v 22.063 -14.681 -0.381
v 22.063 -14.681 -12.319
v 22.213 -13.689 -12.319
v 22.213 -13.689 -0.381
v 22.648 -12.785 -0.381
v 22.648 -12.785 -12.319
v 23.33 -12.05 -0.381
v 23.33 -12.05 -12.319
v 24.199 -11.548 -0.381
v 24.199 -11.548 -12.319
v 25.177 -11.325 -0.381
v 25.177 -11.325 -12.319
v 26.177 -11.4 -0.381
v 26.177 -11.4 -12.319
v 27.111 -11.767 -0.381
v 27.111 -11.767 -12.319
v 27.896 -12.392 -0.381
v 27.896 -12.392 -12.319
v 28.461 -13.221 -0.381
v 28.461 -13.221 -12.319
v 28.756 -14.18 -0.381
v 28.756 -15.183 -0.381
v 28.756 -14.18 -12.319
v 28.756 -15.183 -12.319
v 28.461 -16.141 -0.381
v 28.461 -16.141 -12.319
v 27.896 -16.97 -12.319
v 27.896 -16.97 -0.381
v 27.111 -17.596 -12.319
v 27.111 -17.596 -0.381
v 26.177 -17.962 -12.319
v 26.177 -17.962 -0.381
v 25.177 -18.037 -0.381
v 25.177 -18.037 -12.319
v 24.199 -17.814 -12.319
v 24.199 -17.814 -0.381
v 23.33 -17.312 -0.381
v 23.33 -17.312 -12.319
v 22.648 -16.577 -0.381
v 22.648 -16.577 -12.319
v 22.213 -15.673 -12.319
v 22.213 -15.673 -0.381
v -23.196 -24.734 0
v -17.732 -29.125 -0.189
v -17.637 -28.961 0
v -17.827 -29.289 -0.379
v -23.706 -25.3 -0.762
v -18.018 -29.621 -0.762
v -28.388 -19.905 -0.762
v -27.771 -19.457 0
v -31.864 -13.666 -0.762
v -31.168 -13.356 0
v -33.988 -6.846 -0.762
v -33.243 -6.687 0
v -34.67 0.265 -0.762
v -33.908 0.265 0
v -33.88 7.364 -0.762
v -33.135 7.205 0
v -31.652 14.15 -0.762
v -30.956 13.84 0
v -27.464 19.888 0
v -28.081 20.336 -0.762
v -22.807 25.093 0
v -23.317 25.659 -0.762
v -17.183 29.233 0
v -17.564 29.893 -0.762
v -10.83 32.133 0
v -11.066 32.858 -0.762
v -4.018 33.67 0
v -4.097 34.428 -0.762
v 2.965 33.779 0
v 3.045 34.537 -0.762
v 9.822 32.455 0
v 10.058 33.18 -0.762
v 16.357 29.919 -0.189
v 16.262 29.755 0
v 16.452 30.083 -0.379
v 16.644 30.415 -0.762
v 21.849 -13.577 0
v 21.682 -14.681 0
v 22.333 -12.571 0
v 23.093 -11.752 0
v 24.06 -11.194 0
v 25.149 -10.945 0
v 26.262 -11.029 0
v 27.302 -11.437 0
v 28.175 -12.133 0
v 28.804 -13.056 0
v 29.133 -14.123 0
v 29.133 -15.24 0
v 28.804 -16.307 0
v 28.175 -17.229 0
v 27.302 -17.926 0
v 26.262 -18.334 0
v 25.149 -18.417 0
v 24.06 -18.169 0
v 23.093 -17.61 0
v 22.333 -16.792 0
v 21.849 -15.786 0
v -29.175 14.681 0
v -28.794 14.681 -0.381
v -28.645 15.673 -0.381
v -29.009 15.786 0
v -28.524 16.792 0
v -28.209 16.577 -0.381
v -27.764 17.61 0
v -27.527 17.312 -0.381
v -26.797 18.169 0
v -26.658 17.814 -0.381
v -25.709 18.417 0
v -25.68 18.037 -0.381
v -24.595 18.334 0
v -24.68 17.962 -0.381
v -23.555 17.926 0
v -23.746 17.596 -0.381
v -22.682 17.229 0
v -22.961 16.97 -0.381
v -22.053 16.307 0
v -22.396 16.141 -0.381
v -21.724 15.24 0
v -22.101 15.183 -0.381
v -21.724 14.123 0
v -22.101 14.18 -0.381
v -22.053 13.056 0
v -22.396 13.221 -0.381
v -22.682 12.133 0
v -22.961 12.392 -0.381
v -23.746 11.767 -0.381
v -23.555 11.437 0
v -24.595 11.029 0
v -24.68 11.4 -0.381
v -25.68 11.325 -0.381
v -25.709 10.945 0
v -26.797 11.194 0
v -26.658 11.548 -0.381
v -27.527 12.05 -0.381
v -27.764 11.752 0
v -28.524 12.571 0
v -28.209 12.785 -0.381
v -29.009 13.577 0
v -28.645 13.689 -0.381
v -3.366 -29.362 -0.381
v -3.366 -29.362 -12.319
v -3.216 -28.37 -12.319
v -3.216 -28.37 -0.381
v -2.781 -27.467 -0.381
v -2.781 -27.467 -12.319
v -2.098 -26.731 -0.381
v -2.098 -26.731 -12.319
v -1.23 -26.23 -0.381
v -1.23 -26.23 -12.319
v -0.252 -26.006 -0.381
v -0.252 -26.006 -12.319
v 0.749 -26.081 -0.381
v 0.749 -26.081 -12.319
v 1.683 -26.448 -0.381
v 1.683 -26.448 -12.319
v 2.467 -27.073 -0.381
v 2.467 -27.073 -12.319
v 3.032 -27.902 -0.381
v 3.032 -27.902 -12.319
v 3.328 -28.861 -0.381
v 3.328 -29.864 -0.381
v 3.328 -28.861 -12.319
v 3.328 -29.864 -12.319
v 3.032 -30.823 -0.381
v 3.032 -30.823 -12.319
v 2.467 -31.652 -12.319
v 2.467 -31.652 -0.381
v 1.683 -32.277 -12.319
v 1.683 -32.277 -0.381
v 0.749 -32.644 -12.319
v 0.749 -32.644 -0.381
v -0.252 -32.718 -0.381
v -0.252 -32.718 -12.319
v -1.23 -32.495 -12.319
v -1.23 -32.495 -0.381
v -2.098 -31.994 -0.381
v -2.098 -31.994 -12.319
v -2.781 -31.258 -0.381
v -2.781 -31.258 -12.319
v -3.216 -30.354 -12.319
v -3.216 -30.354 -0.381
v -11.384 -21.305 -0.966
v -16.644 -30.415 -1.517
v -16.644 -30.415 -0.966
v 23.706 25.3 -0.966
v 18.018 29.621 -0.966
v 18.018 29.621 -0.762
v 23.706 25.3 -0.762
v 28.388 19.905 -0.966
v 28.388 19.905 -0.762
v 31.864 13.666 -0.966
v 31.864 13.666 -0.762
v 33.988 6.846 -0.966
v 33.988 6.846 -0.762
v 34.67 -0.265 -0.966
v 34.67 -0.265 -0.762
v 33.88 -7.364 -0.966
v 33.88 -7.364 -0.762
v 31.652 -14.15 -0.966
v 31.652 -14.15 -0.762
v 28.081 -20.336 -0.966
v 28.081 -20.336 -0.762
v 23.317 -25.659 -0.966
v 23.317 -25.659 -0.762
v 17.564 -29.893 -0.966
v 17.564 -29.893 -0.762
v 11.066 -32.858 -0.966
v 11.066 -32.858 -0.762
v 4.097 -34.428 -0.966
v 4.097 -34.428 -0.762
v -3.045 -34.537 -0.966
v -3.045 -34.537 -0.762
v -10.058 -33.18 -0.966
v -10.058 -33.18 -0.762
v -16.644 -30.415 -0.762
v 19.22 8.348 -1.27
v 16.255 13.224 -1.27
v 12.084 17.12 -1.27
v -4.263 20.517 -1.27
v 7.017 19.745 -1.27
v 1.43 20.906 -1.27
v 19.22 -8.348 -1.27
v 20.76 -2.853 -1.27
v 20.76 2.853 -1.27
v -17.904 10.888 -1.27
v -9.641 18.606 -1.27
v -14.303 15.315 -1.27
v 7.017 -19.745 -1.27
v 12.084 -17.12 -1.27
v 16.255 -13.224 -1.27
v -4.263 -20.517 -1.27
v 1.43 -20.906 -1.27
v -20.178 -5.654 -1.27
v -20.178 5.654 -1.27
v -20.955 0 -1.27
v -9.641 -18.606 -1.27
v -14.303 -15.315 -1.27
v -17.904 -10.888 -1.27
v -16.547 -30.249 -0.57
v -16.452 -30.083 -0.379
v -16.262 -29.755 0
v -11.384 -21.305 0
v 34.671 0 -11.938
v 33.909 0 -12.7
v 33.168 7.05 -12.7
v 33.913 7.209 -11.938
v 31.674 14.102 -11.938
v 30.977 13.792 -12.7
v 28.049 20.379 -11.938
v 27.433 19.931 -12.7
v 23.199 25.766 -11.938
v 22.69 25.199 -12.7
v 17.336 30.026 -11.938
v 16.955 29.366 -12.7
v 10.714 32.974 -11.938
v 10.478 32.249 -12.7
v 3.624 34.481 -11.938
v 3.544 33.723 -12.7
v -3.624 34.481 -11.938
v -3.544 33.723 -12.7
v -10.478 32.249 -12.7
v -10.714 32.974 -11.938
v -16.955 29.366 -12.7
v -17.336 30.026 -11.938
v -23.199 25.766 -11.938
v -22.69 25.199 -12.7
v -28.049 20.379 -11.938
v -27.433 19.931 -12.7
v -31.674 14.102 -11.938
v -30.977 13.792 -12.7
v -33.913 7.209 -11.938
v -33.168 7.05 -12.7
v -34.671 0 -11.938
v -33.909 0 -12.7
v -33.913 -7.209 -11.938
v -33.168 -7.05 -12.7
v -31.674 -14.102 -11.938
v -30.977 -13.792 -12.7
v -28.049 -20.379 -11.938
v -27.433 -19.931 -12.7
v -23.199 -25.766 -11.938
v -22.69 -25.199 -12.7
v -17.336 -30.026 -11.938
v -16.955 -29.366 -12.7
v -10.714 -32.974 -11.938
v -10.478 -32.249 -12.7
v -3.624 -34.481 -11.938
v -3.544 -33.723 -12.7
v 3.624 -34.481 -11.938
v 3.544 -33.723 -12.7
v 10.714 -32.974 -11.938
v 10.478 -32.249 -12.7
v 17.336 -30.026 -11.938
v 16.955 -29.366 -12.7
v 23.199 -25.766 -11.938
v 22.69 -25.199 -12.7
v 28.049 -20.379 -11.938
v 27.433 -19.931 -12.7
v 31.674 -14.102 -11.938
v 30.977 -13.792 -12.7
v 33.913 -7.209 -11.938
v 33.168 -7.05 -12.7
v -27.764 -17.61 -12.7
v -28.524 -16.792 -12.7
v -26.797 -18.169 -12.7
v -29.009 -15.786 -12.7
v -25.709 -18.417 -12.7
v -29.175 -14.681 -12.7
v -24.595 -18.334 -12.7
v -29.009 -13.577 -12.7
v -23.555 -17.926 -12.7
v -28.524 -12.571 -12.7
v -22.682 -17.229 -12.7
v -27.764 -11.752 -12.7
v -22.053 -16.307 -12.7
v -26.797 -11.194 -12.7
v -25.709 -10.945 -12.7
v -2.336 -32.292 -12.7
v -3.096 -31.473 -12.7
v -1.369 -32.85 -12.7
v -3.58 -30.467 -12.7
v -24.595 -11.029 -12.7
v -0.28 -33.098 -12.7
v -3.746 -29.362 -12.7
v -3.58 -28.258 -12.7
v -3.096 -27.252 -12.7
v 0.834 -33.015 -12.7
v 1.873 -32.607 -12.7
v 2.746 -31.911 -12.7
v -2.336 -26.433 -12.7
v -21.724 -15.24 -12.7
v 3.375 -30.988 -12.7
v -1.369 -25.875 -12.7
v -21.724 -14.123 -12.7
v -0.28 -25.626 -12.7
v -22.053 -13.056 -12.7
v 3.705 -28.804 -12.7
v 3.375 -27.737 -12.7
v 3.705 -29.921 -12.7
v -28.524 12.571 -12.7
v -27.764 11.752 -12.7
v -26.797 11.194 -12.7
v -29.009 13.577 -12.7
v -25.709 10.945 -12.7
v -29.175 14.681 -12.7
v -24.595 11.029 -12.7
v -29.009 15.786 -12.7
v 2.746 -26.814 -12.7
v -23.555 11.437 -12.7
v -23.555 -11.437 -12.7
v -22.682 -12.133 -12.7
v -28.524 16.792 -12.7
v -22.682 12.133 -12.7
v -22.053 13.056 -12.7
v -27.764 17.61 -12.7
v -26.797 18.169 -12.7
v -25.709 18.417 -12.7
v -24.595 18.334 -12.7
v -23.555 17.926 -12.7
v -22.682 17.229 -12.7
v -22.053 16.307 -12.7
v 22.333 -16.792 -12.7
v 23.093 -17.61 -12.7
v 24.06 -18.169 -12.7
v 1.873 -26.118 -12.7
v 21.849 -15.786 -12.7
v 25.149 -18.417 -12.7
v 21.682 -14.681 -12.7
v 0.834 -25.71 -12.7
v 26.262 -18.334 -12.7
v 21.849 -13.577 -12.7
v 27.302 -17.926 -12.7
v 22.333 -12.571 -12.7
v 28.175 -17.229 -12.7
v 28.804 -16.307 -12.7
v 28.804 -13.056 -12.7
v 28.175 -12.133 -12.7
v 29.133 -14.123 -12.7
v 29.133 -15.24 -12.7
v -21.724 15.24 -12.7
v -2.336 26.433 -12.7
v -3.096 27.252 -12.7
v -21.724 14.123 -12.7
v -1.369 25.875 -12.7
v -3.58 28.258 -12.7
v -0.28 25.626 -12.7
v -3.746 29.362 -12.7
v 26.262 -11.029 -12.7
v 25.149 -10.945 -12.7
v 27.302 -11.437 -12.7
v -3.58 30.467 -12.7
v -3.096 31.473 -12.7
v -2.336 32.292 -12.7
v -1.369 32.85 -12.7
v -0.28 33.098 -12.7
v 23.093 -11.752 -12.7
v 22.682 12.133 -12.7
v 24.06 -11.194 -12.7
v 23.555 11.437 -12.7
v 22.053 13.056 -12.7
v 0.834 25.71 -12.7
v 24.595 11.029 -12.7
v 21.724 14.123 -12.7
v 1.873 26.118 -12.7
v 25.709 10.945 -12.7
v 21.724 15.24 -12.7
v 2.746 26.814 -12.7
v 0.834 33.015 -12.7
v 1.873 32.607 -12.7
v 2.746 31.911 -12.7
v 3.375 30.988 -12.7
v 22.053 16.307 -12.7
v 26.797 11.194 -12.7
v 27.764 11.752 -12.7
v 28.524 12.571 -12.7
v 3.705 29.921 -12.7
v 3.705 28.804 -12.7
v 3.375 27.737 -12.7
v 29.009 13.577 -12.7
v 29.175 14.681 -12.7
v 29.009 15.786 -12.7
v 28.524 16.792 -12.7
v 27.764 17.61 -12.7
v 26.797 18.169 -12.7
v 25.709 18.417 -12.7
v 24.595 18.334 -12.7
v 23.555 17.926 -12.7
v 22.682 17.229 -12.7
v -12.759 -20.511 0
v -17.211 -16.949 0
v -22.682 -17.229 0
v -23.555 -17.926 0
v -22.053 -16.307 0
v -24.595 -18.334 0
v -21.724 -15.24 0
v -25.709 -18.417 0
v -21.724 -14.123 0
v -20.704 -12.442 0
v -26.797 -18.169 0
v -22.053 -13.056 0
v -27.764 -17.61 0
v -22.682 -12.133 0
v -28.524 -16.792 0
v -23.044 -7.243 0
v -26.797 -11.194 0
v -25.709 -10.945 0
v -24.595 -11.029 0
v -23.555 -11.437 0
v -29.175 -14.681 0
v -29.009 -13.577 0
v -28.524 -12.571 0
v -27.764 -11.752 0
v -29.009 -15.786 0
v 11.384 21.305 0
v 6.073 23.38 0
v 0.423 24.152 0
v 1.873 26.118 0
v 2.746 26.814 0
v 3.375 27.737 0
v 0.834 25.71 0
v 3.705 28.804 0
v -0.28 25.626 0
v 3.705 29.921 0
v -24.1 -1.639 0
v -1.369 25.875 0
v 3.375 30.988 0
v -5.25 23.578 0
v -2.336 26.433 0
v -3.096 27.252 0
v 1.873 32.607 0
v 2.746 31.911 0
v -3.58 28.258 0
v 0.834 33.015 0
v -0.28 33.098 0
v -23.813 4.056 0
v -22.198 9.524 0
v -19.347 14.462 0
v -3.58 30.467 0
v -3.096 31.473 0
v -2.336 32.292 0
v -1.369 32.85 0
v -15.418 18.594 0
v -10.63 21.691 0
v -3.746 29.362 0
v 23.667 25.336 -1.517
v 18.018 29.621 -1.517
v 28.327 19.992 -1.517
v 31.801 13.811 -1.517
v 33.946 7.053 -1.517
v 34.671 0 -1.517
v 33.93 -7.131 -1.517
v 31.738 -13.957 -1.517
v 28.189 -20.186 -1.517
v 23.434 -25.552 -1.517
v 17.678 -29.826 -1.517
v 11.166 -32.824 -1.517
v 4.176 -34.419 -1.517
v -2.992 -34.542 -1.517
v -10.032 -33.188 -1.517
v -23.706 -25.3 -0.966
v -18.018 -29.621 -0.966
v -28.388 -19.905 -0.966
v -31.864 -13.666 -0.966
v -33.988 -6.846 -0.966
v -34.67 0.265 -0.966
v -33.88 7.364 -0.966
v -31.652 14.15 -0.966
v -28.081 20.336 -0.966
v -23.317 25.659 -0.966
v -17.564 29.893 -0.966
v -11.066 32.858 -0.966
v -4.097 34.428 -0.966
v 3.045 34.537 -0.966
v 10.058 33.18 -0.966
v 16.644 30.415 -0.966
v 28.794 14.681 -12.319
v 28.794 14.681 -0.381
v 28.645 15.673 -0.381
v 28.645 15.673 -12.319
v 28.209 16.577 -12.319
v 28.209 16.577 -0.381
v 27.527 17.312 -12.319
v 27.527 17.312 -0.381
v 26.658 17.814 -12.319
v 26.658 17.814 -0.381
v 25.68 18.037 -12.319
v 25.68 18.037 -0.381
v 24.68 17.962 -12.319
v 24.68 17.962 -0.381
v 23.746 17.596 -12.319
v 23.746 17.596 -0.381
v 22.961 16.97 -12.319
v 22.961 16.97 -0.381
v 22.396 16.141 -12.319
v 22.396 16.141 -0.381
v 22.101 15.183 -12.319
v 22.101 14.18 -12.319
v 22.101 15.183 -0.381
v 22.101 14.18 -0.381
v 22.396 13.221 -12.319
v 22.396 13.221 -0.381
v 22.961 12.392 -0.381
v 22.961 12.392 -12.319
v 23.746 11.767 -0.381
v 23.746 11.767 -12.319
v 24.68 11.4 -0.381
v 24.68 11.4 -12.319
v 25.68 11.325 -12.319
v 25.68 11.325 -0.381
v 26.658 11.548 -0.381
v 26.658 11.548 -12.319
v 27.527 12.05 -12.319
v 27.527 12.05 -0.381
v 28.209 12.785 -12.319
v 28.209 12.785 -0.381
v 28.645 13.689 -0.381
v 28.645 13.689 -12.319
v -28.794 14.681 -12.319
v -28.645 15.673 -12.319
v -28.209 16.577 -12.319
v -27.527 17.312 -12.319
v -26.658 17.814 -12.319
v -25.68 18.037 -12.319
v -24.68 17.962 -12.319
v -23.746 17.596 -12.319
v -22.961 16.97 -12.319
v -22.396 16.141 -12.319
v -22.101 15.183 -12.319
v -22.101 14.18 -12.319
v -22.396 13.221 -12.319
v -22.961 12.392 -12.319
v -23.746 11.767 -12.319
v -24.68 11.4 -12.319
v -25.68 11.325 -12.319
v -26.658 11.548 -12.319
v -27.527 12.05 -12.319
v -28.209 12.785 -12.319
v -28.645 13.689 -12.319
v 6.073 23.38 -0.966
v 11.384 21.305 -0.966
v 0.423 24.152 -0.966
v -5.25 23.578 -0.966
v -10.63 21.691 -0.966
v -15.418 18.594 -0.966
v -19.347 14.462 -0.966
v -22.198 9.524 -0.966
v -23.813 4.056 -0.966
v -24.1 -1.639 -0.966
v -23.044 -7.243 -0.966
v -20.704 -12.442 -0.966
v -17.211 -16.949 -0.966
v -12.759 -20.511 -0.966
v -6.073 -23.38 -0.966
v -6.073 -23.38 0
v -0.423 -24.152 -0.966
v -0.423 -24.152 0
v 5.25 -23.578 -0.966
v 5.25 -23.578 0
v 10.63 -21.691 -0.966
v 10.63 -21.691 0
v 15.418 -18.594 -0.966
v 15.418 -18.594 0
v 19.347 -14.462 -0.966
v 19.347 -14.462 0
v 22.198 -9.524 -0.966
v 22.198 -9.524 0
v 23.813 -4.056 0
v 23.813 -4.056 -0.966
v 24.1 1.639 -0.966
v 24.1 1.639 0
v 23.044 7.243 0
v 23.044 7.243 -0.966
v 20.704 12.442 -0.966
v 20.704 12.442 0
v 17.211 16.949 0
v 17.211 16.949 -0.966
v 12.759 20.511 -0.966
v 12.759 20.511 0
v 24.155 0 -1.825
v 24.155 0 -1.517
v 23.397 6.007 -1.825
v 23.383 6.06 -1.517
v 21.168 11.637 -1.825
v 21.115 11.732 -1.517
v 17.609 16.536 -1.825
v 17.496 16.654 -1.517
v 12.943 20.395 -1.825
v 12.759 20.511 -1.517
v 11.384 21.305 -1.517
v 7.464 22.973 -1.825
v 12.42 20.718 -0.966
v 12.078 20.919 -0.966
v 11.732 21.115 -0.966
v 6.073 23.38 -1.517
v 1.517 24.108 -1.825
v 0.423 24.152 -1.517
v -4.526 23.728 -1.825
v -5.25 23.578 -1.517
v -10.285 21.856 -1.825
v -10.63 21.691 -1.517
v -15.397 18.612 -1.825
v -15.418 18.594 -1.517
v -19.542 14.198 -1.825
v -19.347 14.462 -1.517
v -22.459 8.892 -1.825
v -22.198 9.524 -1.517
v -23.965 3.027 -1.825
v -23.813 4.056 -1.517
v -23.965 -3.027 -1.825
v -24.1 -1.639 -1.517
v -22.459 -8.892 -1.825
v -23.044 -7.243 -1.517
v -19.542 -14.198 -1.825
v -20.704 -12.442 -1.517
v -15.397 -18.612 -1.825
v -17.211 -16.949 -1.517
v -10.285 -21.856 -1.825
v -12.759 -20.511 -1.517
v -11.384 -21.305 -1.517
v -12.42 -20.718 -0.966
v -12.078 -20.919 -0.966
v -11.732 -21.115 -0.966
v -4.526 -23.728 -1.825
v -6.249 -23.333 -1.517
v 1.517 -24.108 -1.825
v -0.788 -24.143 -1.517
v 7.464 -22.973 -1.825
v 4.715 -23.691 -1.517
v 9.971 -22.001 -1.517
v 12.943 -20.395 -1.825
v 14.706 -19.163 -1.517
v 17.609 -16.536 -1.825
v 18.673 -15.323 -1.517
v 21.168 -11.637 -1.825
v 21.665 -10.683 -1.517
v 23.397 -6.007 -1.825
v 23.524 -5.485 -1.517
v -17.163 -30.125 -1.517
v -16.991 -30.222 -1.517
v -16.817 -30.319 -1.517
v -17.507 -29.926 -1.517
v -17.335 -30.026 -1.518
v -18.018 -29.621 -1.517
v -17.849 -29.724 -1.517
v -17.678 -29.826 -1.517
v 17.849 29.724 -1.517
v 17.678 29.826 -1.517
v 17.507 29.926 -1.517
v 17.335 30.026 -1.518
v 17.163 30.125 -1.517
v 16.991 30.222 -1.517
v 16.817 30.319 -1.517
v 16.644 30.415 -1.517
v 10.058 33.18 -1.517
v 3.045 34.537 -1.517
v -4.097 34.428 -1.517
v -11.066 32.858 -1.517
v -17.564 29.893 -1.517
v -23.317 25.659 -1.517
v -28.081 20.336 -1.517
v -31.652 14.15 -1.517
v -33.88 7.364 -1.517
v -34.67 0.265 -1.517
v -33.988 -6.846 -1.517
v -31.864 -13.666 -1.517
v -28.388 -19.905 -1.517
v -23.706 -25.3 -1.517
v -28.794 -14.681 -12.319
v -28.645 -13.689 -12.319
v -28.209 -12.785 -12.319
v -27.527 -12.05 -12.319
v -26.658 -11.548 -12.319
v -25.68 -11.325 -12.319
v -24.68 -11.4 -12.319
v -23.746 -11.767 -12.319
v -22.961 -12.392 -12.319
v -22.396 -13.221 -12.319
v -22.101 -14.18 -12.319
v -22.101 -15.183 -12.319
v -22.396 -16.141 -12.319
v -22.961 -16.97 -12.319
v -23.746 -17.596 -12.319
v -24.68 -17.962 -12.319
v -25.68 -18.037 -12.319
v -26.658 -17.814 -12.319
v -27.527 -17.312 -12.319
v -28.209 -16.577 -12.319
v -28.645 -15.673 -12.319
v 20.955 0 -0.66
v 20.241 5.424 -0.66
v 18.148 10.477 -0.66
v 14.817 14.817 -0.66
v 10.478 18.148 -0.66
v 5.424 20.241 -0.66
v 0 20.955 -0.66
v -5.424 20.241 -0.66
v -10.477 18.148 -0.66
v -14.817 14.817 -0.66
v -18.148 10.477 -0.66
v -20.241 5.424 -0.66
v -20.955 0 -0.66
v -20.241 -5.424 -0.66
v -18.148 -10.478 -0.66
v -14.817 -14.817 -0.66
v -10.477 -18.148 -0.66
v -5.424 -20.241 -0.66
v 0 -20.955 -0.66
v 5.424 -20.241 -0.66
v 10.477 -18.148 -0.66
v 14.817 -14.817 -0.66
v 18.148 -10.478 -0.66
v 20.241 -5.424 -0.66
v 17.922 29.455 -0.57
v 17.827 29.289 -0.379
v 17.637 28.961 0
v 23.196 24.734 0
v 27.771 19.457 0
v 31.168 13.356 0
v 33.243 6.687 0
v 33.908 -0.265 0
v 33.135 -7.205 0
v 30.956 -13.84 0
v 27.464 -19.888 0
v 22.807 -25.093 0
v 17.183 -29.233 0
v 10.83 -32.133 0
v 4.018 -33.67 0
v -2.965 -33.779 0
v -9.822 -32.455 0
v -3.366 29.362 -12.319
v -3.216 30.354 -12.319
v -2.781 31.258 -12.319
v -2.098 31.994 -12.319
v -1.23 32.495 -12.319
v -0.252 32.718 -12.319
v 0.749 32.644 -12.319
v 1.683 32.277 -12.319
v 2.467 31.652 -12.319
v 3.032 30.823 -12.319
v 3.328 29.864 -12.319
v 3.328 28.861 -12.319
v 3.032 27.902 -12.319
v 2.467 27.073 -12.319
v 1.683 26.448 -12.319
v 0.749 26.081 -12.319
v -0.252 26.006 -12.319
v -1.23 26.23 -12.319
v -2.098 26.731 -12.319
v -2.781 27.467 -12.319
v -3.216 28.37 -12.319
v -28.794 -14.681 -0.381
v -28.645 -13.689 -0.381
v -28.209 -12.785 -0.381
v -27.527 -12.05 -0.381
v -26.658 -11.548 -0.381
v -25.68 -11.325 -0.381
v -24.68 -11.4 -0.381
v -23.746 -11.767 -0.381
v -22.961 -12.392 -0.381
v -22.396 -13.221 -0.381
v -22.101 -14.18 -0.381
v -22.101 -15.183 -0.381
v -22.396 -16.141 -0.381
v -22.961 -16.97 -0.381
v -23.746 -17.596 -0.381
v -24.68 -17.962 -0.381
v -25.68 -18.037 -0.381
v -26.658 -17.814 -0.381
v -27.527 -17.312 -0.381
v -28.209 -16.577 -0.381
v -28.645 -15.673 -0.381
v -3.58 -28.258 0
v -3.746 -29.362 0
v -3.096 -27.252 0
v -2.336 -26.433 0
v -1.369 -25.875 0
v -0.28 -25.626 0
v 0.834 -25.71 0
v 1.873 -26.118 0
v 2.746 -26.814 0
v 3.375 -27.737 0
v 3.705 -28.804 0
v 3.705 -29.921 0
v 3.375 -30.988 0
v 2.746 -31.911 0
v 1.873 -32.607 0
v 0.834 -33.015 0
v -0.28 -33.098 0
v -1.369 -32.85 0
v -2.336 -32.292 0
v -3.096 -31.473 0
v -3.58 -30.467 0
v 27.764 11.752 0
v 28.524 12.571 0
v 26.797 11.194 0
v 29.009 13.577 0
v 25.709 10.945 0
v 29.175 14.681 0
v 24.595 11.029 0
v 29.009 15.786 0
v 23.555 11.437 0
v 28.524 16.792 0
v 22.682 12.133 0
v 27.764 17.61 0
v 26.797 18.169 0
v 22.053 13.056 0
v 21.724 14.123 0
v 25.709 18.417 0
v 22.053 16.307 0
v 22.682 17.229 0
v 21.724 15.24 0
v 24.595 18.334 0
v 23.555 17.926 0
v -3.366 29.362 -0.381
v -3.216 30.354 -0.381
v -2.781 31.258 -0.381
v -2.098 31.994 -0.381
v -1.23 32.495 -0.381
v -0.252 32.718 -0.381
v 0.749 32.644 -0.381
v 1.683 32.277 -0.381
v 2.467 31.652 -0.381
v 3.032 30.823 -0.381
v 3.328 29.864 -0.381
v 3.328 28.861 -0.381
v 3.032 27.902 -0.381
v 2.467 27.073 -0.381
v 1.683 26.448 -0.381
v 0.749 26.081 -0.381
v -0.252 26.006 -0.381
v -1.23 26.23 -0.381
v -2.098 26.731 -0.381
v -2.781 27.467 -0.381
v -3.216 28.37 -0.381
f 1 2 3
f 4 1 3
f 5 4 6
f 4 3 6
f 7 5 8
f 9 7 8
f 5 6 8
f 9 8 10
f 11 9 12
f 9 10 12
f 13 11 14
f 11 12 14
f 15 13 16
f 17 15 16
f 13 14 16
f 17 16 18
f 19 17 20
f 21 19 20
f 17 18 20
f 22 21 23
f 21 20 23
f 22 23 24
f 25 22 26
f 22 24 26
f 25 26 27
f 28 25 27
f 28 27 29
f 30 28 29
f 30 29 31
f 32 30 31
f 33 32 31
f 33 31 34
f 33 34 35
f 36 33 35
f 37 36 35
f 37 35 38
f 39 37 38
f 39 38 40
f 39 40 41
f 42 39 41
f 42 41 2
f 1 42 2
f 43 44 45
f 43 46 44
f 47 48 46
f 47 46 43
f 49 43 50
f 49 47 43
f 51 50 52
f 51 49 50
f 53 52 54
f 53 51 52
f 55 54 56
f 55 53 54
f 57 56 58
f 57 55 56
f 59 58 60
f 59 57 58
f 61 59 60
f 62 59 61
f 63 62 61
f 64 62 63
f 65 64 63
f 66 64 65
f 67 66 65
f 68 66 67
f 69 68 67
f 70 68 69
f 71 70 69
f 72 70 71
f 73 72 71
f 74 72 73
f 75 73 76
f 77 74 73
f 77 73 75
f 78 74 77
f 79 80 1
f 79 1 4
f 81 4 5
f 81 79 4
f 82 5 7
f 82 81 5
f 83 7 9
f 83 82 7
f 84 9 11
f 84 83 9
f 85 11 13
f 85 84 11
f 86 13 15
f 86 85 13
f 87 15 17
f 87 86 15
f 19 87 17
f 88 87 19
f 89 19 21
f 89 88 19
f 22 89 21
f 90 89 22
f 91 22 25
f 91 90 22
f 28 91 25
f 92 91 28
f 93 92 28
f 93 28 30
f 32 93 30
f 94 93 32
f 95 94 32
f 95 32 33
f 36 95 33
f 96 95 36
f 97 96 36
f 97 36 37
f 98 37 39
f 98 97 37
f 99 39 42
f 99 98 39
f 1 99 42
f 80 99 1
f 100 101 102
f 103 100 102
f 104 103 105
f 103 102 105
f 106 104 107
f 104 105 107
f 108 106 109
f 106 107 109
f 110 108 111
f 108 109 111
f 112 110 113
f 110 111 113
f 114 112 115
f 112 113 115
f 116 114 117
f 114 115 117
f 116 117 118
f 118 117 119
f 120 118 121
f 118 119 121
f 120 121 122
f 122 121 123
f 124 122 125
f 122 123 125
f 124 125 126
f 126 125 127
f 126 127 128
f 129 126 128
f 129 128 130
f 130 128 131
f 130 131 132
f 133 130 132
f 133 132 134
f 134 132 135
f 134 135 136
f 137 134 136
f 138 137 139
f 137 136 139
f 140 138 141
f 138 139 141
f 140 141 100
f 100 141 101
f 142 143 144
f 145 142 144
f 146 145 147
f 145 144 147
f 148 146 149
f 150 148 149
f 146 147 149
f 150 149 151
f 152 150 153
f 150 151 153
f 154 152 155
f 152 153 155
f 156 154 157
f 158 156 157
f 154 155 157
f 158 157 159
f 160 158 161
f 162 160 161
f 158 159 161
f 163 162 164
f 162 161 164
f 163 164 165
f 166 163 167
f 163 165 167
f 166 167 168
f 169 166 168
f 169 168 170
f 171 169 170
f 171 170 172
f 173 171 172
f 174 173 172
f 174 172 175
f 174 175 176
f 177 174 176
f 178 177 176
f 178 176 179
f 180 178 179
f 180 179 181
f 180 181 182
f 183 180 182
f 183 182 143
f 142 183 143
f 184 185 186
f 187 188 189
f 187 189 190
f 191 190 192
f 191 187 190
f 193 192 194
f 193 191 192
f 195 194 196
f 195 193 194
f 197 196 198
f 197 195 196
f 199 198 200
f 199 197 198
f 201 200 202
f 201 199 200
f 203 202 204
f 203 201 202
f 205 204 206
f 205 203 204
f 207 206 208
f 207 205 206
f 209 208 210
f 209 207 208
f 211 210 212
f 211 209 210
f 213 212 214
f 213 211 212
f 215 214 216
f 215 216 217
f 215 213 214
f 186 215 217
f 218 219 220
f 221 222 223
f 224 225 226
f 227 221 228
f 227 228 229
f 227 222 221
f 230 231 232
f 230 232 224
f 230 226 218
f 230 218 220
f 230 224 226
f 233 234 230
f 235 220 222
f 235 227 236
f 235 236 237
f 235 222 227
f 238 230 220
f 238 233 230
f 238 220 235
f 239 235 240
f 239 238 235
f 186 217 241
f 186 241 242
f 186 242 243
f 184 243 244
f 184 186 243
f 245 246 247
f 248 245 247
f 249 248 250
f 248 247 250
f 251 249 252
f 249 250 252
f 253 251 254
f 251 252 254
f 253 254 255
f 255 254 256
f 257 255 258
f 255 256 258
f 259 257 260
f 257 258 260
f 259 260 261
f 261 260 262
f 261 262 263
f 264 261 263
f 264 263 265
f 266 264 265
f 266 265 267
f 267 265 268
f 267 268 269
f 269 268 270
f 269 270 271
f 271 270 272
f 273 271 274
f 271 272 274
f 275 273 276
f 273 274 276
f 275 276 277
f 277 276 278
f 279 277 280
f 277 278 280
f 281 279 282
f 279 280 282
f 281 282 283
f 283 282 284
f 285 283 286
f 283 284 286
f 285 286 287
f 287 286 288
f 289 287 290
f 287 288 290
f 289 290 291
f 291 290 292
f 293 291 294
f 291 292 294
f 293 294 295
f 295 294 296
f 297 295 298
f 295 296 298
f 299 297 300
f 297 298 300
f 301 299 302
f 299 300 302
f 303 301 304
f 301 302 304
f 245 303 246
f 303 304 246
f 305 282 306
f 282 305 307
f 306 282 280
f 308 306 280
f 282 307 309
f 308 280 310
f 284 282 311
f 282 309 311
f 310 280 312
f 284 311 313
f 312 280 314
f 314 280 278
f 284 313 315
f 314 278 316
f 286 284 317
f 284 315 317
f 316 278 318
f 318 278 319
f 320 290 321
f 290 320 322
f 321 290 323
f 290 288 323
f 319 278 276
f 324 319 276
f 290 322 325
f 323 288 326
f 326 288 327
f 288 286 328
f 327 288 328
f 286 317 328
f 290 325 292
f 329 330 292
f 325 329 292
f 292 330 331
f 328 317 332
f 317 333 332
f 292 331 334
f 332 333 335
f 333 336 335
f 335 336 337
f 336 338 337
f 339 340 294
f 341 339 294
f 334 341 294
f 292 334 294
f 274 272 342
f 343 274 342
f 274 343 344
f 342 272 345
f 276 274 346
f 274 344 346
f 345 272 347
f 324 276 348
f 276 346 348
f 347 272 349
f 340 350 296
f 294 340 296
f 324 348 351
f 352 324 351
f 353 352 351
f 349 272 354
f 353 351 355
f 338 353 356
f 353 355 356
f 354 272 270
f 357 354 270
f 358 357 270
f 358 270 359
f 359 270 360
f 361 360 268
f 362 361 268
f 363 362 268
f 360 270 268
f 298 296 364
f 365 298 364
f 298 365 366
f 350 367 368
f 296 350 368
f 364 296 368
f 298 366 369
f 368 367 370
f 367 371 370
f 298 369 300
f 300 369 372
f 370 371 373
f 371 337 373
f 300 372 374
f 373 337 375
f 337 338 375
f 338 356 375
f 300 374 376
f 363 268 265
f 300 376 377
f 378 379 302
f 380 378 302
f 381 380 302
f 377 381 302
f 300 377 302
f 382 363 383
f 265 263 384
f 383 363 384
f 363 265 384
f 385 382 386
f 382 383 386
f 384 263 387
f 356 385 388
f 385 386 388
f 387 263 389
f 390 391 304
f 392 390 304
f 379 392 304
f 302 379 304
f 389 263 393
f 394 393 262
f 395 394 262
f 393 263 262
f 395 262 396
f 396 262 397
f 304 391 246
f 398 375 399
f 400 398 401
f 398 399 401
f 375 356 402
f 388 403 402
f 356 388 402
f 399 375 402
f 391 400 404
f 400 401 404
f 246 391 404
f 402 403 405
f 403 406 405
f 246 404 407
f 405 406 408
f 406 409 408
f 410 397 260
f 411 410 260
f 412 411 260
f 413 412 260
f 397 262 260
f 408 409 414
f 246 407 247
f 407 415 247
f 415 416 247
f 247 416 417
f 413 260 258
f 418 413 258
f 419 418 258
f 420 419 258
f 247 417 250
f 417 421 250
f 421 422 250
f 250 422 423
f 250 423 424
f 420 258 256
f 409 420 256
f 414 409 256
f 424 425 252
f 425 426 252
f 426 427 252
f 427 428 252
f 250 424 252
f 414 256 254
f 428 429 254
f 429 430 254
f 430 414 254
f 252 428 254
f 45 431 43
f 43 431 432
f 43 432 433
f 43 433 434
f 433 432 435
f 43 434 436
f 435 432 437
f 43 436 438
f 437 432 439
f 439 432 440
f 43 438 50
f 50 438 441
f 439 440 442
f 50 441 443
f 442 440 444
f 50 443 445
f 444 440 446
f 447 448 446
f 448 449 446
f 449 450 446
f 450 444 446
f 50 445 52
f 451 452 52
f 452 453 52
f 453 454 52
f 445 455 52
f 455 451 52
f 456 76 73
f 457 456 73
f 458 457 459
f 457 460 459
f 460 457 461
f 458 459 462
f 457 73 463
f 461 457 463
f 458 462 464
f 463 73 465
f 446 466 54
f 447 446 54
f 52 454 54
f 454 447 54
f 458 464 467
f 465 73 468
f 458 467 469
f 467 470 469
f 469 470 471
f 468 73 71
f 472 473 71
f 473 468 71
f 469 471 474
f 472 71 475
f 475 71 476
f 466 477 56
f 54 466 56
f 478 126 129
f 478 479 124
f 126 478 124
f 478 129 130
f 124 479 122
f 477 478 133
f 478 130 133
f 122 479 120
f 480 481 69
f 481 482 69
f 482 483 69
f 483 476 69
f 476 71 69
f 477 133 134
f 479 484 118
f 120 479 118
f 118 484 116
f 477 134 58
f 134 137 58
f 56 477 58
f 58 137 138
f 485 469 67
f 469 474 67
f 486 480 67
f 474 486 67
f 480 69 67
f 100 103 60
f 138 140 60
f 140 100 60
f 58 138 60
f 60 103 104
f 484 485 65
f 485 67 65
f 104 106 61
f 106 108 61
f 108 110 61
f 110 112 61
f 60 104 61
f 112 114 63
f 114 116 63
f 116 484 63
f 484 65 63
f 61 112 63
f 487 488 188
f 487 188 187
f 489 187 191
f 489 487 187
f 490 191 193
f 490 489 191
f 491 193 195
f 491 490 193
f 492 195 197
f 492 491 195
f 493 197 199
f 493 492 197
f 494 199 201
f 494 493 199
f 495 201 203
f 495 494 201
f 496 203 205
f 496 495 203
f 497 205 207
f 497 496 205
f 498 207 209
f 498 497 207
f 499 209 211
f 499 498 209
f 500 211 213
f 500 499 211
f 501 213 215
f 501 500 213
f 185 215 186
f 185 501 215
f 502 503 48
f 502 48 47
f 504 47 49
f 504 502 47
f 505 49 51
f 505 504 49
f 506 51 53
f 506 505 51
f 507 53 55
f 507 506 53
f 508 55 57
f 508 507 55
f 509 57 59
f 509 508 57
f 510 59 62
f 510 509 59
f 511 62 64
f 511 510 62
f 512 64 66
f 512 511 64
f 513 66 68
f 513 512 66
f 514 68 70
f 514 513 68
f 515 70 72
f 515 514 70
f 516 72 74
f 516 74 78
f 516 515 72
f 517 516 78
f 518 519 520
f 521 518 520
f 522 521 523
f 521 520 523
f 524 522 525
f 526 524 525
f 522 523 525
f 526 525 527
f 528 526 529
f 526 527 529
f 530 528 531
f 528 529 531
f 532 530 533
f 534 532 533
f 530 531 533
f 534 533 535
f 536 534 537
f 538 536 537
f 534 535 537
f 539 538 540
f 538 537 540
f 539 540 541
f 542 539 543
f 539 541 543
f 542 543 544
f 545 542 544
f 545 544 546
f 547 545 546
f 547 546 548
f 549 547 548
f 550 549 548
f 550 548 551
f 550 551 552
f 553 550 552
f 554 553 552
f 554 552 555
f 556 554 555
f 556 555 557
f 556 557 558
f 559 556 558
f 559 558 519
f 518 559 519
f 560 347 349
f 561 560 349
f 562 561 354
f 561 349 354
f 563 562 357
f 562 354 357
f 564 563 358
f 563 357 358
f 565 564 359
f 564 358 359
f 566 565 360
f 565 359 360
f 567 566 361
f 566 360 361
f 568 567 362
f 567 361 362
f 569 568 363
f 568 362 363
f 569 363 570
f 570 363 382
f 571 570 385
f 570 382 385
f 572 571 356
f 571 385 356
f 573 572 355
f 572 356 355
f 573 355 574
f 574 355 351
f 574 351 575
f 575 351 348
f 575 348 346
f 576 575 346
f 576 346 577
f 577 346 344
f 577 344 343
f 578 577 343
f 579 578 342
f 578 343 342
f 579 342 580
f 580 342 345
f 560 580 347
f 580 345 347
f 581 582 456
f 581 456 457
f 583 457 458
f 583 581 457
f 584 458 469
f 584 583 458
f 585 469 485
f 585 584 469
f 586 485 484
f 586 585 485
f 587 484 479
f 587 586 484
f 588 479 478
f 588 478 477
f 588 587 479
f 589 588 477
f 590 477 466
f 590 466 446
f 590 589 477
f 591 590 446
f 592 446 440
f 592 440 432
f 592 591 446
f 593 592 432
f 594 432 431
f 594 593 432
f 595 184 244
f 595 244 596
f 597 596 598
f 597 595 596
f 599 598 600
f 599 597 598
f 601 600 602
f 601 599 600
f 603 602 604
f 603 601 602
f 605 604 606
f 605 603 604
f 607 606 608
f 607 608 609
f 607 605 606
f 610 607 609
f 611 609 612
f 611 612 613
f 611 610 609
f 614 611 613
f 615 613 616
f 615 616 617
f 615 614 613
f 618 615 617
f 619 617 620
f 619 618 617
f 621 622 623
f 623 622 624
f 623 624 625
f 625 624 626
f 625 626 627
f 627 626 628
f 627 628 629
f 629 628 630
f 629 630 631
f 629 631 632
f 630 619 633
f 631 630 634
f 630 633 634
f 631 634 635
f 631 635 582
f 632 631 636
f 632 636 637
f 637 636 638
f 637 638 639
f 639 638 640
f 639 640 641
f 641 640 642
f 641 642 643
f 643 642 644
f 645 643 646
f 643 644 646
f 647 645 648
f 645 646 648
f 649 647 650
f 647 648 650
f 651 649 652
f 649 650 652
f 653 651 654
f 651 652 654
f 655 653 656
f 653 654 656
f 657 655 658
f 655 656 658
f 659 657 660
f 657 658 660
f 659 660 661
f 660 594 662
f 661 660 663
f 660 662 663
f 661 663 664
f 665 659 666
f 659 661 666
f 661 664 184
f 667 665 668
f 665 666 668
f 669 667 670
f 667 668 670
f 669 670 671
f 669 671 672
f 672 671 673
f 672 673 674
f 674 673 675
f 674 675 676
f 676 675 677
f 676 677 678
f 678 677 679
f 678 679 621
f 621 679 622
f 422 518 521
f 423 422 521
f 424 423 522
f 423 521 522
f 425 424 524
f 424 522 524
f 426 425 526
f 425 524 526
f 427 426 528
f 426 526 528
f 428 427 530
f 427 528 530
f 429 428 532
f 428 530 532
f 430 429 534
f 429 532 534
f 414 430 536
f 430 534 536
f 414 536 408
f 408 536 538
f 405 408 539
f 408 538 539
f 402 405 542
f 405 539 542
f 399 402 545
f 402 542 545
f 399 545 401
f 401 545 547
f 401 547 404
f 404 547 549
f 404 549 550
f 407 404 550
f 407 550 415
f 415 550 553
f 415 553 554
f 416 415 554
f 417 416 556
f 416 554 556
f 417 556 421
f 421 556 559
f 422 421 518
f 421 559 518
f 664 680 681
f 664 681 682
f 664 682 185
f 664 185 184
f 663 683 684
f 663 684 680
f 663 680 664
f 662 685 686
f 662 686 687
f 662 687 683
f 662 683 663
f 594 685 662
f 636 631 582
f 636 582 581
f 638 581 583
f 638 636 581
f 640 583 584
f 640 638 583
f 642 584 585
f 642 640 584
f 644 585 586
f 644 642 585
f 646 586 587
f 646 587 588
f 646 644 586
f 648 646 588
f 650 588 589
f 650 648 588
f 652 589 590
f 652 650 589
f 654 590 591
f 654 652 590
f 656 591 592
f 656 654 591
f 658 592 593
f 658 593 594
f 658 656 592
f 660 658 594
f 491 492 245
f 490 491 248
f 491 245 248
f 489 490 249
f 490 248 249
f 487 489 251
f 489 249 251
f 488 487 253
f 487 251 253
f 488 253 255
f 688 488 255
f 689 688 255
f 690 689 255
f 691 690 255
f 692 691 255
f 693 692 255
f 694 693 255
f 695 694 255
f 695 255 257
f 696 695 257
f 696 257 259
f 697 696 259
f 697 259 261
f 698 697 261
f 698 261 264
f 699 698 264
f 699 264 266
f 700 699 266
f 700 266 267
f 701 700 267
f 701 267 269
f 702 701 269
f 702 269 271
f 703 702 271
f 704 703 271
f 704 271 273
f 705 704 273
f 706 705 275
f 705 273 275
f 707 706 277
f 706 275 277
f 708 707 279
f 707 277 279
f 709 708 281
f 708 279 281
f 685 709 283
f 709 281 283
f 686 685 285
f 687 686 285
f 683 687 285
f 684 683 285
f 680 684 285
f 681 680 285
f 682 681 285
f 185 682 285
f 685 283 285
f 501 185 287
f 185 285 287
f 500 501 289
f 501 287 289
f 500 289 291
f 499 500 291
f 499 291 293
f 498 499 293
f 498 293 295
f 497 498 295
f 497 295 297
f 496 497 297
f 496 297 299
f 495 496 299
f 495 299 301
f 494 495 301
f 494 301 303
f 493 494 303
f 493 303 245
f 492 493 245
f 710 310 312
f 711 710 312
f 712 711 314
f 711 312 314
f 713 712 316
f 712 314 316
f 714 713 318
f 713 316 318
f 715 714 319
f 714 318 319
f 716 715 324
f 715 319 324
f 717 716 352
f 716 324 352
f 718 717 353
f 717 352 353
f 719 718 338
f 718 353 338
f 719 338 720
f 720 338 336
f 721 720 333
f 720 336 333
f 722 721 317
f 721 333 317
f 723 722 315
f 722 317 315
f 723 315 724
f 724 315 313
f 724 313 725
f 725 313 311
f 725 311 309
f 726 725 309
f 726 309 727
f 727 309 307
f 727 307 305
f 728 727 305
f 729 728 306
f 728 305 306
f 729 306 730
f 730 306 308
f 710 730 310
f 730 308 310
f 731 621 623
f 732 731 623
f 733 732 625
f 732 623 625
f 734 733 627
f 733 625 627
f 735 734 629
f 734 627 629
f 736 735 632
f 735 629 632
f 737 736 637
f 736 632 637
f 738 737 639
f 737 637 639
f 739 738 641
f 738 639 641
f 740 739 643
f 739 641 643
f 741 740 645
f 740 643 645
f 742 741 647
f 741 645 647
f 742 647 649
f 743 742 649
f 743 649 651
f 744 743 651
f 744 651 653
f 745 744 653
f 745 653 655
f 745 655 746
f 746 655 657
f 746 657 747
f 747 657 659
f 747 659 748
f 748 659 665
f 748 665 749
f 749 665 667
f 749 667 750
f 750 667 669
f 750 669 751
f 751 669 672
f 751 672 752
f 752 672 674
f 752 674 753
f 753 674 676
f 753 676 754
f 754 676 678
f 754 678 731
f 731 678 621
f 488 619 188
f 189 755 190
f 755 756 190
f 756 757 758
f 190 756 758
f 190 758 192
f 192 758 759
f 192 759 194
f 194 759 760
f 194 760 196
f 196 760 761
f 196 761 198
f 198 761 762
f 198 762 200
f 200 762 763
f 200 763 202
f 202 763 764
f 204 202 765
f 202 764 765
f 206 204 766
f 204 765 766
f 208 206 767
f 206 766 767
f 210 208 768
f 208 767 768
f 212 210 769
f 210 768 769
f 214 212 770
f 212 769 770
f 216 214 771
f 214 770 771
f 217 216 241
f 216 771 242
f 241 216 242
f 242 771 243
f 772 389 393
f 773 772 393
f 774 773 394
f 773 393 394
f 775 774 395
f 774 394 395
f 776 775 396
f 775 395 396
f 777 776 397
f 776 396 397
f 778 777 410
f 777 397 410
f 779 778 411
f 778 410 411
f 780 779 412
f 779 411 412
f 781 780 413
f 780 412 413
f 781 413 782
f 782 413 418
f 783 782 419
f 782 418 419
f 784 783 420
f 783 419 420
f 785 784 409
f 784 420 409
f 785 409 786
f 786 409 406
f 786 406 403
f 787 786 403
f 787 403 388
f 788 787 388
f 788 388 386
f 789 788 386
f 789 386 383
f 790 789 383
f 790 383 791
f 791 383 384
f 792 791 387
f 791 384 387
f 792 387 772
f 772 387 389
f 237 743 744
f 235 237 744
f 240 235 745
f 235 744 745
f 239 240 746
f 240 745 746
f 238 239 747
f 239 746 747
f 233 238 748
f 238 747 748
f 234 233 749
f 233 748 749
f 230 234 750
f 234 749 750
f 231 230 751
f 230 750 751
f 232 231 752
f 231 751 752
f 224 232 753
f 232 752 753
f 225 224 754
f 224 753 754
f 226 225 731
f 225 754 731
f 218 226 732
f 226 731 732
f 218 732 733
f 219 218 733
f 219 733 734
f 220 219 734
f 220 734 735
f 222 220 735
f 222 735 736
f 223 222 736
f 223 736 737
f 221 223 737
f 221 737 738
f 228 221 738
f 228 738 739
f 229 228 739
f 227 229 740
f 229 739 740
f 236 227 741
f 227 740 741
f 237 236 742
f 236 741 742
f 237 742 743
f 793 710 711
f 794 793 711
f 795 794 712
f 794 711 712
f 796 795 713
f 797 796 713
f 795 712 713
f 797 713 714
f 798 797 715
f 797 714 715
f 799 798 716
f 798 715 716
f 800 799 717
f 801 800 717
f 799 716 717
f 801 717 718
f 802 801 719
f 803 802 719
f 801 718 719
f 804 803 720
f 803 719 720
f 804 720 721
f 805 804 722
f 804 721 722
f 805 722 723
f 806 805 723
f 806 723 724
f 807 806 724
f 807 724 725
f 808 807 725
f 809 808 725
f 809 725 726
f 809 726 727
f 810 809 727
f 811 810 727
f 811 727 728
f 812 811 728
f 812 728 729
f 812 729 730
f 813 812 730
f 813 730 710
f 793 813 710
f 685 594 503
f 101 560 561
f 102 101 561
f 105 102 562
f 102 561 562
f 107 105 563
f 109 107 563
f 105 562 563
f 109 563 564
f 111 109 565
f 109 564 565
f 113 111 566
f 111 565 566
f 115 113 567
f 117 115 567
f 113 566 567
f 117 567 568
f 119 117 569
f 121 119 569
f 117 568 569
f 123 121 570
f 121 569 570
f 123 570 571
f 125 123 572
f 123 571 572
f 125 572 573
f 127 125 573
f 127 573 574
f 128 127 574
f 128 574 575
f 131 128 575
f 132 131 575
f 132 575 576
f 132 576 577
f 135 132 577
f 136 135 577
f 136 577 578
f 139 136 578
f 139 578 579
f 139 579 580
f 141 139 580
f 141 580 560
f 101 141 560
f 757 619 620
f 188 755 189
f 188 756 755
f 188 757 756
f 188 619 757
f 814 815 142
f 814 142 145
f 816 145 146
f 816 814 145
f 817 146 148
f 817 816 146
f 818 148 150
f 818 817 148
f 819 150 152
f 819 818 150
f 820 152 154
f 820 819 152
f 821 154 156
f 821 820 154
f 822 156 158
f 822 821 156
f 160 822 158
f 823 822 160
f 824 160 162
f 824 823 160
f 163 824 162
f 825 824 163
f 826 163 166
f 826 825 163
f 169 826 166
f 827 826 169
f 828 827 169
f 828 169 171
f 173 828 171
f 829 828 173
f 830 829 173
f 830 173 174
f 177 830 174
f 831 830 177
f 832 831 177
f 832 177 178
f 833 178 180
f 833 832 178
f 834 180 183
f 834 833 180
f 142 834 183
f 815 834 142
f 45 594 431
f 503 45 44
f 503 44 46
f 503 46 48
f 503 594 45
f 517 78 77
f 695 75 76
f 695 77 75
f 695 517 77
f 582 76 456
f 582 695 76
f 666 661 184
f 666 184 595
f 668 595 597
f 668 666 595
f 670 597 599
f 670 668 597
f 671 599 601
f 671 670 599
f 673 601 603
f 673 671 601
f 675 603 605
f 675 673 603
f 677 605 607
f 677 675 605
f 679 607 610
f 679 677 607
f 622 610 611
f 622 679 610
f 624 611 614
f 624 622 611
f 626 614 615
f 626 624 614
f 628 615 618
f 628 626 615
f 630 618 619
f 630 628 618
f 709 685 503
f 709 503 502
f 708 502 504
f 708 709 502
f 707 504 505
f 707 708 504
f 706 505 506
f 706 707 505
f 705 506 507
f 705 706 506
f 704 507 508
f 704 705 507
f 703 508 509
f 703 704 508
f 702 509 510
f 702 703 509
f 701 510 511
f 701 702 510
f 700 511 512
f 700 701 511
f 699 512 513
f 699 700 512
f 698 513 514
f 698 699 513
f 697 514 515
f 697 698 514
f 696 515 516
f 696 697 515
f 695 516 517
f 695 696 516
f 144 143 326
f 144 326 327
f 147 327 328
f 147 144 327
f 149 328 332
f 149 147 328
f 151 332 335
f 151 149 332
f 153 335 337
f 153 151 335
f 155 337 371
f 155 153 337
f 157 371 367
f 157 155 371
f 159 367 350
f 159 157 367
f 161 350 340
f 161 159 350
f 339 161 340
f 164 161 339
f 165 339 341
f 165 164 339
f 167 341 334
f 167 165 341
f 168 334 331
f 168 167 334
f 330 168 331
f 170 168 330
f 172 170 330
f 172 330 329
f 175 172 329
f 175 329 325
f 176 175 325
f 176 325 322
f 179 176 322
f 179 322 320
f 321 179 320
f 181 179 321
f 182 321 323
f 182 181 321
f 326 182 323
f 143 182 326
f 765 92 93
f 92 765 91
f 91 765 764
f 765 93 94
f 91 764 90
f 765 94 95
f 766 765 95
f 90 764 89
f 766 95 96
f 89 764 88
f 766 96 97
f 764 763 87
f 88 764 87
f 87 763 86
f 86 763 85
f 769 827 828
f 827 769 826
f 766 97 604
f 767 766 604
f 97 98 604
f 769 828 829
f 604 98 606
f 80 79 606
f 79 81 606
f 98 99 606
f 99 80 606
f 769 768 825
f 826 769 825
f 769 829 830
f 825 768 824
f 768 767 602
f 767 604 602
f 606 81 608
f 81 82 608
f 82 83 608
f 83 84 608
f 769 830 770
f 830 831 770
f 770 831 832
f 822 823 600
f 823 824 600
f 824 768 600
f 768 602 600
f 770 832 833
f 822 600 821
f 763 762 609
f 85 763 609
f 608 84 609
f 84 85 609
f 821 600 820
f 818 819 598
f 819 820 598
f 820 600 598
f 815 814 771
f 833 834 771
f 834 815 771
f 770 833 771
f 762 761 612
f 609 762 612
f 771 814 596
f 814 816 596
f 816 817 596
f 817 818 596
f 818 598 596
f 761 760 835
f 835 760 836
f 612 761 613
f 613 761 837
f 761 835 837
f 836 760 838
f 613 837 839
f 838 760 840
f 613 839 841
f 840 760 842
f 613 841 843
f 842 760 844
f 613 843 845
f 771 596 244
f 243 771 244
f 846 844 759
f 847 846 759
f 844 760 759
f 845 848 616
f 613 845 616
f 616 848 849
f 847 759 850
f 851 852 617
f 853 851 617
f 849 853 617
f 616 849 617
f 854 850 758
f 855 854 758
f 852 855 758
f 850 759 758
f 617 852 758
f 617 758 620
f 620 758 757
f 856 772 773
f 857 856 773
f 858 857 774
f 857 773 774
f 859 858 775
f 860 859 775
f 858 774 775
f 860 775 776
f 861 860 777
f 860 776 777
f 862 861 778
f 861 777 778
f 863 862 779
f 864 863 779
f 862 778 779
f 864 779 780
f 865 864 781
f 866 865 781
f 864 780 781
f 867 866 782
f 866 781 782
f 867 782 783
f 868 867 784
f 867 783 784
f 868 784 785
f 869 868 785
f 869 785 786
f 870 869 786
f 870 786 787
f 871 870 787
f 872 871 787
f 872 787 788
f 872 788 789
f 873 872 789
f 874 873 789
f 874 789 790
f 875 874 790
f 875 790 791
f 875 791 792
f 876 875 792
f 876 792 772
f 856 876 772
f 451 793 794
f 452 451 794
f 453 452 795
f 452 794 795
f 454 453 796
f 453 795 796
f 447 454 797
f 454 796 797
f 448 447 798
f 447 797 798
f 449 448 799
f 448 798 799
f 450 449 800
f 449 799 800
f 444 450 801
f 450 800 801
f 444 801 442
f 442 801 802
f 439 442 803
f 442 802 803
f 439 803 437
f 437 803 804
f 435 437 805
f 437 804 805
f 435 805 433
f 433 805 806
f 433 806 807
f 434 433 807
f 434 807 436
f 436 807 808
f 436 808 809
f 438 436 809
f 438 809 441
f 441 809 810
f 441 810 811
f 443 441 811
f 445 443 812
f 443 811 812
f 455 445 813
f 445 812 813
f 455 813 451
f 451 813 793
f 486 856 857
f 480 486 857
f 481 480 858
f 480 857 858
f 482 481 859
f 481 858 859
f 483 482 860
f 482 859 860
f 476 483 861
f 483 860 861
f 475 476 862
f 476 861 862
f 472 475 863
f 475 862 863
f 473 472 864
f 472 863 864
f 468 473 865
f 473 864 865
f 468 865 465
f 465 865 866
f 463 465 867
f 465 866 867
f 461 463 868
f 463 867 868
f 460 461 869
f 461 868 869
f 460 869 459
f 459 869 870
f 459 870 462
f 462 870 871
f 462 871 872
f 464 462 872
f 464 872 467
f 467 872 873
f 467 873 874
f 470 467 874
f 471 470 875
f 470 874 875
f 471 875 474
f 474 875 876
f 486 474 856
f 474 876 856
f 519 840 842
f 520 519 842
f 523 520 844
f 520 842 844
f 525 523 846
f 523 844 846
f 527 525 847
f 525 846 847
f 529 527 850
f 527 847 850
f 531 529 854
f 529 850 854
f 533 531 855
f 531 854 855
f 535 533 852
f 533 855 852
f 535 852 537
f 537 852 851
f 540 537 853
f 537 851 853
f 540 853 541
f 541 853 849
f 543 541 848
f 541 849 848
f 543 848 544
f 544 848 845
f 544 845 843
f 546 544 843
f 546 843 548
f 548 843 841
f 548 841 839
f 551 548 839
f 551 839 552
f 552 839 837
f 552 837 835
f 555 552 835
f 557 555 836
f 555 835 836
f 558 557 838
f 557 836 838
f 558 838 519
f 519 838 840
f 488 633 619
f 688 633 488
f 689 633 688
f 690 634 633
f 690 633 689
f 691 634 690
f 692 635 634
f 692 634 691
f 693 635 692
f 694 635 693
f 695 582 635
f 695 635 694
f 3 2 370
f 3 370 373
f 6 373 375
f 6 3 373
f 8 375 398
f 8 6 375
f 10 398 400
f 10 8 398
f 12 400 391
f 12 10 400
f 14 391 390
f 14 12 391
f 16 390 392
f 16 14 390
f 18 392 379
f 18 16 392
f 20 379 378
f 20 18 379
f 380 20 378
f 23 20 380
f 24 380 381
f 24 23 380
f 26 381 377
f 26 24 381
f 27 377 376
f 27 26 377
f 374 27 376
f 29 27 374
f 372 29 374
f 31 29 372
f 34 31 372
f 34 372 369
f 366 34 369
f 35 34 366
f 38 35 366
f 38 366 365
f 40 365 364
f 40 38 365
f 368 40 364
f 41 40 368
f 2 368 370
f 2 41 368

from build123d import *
from build123d.topology import SkipClean

# Parameters (mm, degrees)
CUT_EXTRUDE1_START       = -11.734260502
CUT_EXTRUDE1_OUTLINE_R   = 34.671
CUT_EXTRUDE1_DEPTH       = 11.182953842
CUT_EXTRUDE1_START_2     = -0.55130666
CUT_EXTRUDE1_2_OUTLINE_R = 24.1554
CUT_EXTRUDE1_2_DEPTH     = 0.856646158
CUT_EXTRUDE1_3_DEPTH     = 0.55130666
CUT_EXTRUDE1_START_3     = -0.79375
CUT_EXTRUDE1_5_DEPTH     = 1.5875
CUT_EXTRUDE2_START       = -0.55130666
CUT_EXTRUDE2_DEPTH       = 0.55130666
BOSS_EXTRUDE1_DEPTH      = 0.55130666
BOSS_EXTRUDE2_DEPTH      = 0.55130666
BOSS_EXTRUDE3_DEPTH      = 0.965739498
BOSS_EXTRUDE4_DEPTH      = 0.965739498
SKETCH7_R                = 20.955
CUT_EXTRUDE3_DEPTH       = 0.6096
M6_CLEARANCE_HOLE1_D     = 6.731
M6_CLEARANCE_HOLE2_D     = 6.731
CHAMFER1_SIZE            = 0.381
CHAMFER2_SIZE            = 0.762


with BuildPart() as part:
    # Cut-Extrude1: read off the stored shape, not the designer's step
    # Cut-Extrude1 outline → Cut-Extrude1 (new body)
    with BuildSketch(Plane.XY.offset(-0.965739498).offset(CUT_EXTRUDE1_START)):
        Circle(CUT_EXTRUDE1_OUTLINE_R)
    extrude(amount=CUT_EXTRUDE1_DEPTH)

    # Cut-Extrude1 2 outline → Cut-Extrude1 2 (add)
    with BuildSketch(Plane.XY.offset(-0.965739498).offset(CUT_EXTRUDE1_START_2)):
        Circle(CUT_EXTRUDE1_2_OUTLINE_R)
    extrude(amount=CUT_EXTRUDE1_2_DEPTH)

    # Cut-Extrude1 3 outline → Cut-Extrude1 3 (add)
    with BuildSketch(Plane.XY.offset(-0.965739498).offset(CUT_EXTRUDE1_START_2)):
        with BuildLine():
            Line((12.758585218, 20.51101783), (18.018364086, 29.621222066))
            ThreePointArc((18.018364086, 29.621222066), (-30.025966775, 17.3355), (-16.643548757, -30.414972066))
            Line((-16.643548757, -30.414972066), (-11.383769889, -21.30476783))
            ThreePointArc((-11.383769889, -21.30476783), (-20.919190039, 12.0777), (12.758585218, 20.51101783))
        make_face()
    extrude(amount=CUT_EXTRUDE1_3_DEPTH)

    # Cut-Extrude1 4 outline → Cut-Extrude1 4 (revolve, cut)
    with BuildSketch(Plane.XZ):
        Polygon((24.1554, -1.825250338), (24.1554, -0.6604), (20.955, -0.6604), align=None)
    revolve(axis=Axis((0, 0, 0), (0, 0, 1)), mode=Mode.SUBTRACT)

    # Cut-Extrude1 5 outline → Cut-Extrude1 5 (cut)
    with BuildSketch(Plane(origin=(0, 0, 0), x_dir=(0.49999999999977696, 0.8660254037845674, 0), z_dir=(0.8660254037845674, -0.4999999999997772, 0)).offset(CUT_EXTRUDE1_START_3)):
        Polygon((36, -0.965739498), (24.142355107, -0.965739498), (34.671, -1.517522396), (36, -1.587172335), align=None)
        Polygon((-34.671, -1.517522396), (-24.142355107, -0.965739498), (-36, -0.965739498), (-36, -1.587172335), align=None)
    extrude(amount=CUT_EXTRUDE1_5_DEPTH, mode=Mode.SUBTRACT)

    # Sketch2 → Cut-Extrude2 (cut)
    with BuildSketch(Plane.XY.offset(-0.965739498).offset(CUT_EXTRUDE2_START)):
        with BuildLine():
            Line((-18.018364086, -29.621222066), (-12.758585218, -20.51101783))
            ThreePointArc((-12.758585218, -20.51101783), (-20.919190039, 12.0777), (11.383769889, 21.30476783))
            Line((11.383769889, 21.30476783), (16.643548757, 30.414972066))
            ThreePointArc((16.643548757, 30.414972066), (-30.025966775, 17.3355), (-18.018364086, -29.621222066))
        make_face()
    extrude(amount=CUT_EXTRUDE2_DEPTH, mode=Mode.SUBTRACT)

    # Sketch3 → Boss-Extrude1 (add)
    with SkipClean():  # the faces are left unmerged after this step: merging them gives an invalid solid
        with BuildSketch(Plane.XY.offset(-1.517046158)):
            with BuildLine():
                Line((-16.643548757, -30.414972066), (-11.383769889, -21.30476783))
                ThreePointArc((-11.383769889, -21.30476783), (20.919190039, -12.0777), (12.758585218, 20.51101783))
                Line((12.758585218, 20.51101783), (18.018364086, 29.621222066))
                ThreePointArc((18.018364086, 29.621222066), (30.025966775, -17.3355), (-16.643548757, -30.414972066))
            make_face()
        extrude(amount=BOSS_EXTRUDE1_DEPTH)

    # Sketch4 → Boss-Extrude2 (add)
    with SkipClean():  # the faces are left unmerged after this step: merging them gives an invalid solid
        with BuildSketch(Plane.XY.offset(-1.517046158)):
            with BuildLine():
                Line((16.643548757, 30.414972066), (11.383769889, 21.30476783))
                ThreePointArc((11.383769889, 21.30476783), (-20.919190039, 12.0777), (-12.758585218, -20.51101783))
                Line((-12.758585218, -20.51101783), (-18.018364086, -29.621222066))
                ThreePointArc((-18.018364086, -29.621222066), (-30.025966775, 17.3355), (16.643548757, 30.414972066))
            make_face()
        extrude(amount=BOSS_EXTRUDE2_DEPTH)

    # Sketch5 → Boss-Extrude3 (add)
    with SkipClean():  # the faces are left unmerged after this step: merging them gives an invalid solid
        with BuildSketch(Plane.XY.offset(-0.965739498)):
            with BuildLine():
                Line((-16.643548757, -30.414972066), (-11.383769889, -21.30476783))
                ThreePointArc((-11.383769889, -21.30476783), (20.919190039, -12.0777), (12.758585218, 20.51101783))
                Line((12.758585218, 20.51101783), (18.018364086, 29.621222066))
                ThreePointArc((18.018364086, 29.621222066), (30.025966775, -17.3355), (-16.643548757, -30.414972066))
            make_face()
        extrude(amount=BOSS_EXTRUDE3_DEPTH)

    # Sketch6 → Boss-Extrude4 (add)
    with SkipClean():  # the faces are left unmerged after this step: merging them gives an invalid solid
        with BuildSketch(Plane.XY.offset(-0.965739498)):
            with BuildLine():
                Line((16.643548757, 30.414972066), (11.383769889, 21.30476783))
                ThreePointArc((11.383769889, 21.30476783), (-20.919190039, 12.0777), (-12.758585218, -20.51101783))
                Line((-12.758585218, -20.51101783), (-18.018364086, -29.621222066))
                ThreePointArc((-18.018364086, -29.621222066), (-30.025966775, 17.3355), (16.643548757, 30.414972066))
            make_face()
        extrude(amount=BOSS_EXTRUDE4_DEPTH)

    # Sketch7 → Cut-Extrude3 (cut)
    with SkipClean():  # the faces are left unmerged after this step: merging them gives an invalid solid
        with BuildSketch(Plane.XY.offset(-0.6604)):
            with Locations(Location((0, 0, 0), (0, 0, 180))):
                Circle(SKETCH7_R)
        extrude(amount=-CUT_EXTRUDE3_DEPTH, mode=Mode.SUBTRACT)

    # M6 Clearance Hole1 (through all)
    with Locations(Plane(origin=(0, 0, -12.7), x_dir=(-1, 0, 0), z_dir=(0, 0, -1))):
        with Locations((-25.428584316, 14.6812)):
            Hole(M6_CLEARANCE_HOLE1_D / 2)

    # M6 Clearance Hole2 (through all)
    with Locations(Plane.XY):
        with Locations((0, 29.3624), (25.428584316, -14.6812), (0, -29.3624), (-25.428584316, -14.6812), (-25.428584316, 14.6812)):
            Hole(M6_CLEARANCE_HOLE2_D / 2)

    # Chamfer1
    chamfer1_edges = [part.edges().sort_by_distance(p)[0] for p in [
        (22.063084316, 14.6812, -12.7),
        (22.063084316, 14.6812, 0),
        (-22.063084316, 14.6812, 0),
        (-22.063084316, 14.6812, -12.7),
        (-22.063084316, -14.6812, 0),
        (-22.063084316, -14.6812, -12.7),
        (3.3655, -29.3624, 0),
        (3.3655, -29.3624, -12.7),
        (28.794084316, -14.6812, 0),
        (28.794084316, -14.6812, -12.7),
        (3.3655, 29.3624, 0),
        (3.3655, 29.3624, -12.7),
    ]]
    chamfer(chamfer1_edges, length=CHAMFER1_SIZE)

    # Chamfer2
    chamfer2_edges = [part.edges().sort_by_distance(p)[0] for p in [
        (30.025966775, -17.3355, 0),
        (-30.025966775, 17.3355, 0),
        (-34.671, 0, -12.7),
    ]]
    chamfer(chamfer2_edges, length=CHAMFER2_SIZE)


solid = part.part
